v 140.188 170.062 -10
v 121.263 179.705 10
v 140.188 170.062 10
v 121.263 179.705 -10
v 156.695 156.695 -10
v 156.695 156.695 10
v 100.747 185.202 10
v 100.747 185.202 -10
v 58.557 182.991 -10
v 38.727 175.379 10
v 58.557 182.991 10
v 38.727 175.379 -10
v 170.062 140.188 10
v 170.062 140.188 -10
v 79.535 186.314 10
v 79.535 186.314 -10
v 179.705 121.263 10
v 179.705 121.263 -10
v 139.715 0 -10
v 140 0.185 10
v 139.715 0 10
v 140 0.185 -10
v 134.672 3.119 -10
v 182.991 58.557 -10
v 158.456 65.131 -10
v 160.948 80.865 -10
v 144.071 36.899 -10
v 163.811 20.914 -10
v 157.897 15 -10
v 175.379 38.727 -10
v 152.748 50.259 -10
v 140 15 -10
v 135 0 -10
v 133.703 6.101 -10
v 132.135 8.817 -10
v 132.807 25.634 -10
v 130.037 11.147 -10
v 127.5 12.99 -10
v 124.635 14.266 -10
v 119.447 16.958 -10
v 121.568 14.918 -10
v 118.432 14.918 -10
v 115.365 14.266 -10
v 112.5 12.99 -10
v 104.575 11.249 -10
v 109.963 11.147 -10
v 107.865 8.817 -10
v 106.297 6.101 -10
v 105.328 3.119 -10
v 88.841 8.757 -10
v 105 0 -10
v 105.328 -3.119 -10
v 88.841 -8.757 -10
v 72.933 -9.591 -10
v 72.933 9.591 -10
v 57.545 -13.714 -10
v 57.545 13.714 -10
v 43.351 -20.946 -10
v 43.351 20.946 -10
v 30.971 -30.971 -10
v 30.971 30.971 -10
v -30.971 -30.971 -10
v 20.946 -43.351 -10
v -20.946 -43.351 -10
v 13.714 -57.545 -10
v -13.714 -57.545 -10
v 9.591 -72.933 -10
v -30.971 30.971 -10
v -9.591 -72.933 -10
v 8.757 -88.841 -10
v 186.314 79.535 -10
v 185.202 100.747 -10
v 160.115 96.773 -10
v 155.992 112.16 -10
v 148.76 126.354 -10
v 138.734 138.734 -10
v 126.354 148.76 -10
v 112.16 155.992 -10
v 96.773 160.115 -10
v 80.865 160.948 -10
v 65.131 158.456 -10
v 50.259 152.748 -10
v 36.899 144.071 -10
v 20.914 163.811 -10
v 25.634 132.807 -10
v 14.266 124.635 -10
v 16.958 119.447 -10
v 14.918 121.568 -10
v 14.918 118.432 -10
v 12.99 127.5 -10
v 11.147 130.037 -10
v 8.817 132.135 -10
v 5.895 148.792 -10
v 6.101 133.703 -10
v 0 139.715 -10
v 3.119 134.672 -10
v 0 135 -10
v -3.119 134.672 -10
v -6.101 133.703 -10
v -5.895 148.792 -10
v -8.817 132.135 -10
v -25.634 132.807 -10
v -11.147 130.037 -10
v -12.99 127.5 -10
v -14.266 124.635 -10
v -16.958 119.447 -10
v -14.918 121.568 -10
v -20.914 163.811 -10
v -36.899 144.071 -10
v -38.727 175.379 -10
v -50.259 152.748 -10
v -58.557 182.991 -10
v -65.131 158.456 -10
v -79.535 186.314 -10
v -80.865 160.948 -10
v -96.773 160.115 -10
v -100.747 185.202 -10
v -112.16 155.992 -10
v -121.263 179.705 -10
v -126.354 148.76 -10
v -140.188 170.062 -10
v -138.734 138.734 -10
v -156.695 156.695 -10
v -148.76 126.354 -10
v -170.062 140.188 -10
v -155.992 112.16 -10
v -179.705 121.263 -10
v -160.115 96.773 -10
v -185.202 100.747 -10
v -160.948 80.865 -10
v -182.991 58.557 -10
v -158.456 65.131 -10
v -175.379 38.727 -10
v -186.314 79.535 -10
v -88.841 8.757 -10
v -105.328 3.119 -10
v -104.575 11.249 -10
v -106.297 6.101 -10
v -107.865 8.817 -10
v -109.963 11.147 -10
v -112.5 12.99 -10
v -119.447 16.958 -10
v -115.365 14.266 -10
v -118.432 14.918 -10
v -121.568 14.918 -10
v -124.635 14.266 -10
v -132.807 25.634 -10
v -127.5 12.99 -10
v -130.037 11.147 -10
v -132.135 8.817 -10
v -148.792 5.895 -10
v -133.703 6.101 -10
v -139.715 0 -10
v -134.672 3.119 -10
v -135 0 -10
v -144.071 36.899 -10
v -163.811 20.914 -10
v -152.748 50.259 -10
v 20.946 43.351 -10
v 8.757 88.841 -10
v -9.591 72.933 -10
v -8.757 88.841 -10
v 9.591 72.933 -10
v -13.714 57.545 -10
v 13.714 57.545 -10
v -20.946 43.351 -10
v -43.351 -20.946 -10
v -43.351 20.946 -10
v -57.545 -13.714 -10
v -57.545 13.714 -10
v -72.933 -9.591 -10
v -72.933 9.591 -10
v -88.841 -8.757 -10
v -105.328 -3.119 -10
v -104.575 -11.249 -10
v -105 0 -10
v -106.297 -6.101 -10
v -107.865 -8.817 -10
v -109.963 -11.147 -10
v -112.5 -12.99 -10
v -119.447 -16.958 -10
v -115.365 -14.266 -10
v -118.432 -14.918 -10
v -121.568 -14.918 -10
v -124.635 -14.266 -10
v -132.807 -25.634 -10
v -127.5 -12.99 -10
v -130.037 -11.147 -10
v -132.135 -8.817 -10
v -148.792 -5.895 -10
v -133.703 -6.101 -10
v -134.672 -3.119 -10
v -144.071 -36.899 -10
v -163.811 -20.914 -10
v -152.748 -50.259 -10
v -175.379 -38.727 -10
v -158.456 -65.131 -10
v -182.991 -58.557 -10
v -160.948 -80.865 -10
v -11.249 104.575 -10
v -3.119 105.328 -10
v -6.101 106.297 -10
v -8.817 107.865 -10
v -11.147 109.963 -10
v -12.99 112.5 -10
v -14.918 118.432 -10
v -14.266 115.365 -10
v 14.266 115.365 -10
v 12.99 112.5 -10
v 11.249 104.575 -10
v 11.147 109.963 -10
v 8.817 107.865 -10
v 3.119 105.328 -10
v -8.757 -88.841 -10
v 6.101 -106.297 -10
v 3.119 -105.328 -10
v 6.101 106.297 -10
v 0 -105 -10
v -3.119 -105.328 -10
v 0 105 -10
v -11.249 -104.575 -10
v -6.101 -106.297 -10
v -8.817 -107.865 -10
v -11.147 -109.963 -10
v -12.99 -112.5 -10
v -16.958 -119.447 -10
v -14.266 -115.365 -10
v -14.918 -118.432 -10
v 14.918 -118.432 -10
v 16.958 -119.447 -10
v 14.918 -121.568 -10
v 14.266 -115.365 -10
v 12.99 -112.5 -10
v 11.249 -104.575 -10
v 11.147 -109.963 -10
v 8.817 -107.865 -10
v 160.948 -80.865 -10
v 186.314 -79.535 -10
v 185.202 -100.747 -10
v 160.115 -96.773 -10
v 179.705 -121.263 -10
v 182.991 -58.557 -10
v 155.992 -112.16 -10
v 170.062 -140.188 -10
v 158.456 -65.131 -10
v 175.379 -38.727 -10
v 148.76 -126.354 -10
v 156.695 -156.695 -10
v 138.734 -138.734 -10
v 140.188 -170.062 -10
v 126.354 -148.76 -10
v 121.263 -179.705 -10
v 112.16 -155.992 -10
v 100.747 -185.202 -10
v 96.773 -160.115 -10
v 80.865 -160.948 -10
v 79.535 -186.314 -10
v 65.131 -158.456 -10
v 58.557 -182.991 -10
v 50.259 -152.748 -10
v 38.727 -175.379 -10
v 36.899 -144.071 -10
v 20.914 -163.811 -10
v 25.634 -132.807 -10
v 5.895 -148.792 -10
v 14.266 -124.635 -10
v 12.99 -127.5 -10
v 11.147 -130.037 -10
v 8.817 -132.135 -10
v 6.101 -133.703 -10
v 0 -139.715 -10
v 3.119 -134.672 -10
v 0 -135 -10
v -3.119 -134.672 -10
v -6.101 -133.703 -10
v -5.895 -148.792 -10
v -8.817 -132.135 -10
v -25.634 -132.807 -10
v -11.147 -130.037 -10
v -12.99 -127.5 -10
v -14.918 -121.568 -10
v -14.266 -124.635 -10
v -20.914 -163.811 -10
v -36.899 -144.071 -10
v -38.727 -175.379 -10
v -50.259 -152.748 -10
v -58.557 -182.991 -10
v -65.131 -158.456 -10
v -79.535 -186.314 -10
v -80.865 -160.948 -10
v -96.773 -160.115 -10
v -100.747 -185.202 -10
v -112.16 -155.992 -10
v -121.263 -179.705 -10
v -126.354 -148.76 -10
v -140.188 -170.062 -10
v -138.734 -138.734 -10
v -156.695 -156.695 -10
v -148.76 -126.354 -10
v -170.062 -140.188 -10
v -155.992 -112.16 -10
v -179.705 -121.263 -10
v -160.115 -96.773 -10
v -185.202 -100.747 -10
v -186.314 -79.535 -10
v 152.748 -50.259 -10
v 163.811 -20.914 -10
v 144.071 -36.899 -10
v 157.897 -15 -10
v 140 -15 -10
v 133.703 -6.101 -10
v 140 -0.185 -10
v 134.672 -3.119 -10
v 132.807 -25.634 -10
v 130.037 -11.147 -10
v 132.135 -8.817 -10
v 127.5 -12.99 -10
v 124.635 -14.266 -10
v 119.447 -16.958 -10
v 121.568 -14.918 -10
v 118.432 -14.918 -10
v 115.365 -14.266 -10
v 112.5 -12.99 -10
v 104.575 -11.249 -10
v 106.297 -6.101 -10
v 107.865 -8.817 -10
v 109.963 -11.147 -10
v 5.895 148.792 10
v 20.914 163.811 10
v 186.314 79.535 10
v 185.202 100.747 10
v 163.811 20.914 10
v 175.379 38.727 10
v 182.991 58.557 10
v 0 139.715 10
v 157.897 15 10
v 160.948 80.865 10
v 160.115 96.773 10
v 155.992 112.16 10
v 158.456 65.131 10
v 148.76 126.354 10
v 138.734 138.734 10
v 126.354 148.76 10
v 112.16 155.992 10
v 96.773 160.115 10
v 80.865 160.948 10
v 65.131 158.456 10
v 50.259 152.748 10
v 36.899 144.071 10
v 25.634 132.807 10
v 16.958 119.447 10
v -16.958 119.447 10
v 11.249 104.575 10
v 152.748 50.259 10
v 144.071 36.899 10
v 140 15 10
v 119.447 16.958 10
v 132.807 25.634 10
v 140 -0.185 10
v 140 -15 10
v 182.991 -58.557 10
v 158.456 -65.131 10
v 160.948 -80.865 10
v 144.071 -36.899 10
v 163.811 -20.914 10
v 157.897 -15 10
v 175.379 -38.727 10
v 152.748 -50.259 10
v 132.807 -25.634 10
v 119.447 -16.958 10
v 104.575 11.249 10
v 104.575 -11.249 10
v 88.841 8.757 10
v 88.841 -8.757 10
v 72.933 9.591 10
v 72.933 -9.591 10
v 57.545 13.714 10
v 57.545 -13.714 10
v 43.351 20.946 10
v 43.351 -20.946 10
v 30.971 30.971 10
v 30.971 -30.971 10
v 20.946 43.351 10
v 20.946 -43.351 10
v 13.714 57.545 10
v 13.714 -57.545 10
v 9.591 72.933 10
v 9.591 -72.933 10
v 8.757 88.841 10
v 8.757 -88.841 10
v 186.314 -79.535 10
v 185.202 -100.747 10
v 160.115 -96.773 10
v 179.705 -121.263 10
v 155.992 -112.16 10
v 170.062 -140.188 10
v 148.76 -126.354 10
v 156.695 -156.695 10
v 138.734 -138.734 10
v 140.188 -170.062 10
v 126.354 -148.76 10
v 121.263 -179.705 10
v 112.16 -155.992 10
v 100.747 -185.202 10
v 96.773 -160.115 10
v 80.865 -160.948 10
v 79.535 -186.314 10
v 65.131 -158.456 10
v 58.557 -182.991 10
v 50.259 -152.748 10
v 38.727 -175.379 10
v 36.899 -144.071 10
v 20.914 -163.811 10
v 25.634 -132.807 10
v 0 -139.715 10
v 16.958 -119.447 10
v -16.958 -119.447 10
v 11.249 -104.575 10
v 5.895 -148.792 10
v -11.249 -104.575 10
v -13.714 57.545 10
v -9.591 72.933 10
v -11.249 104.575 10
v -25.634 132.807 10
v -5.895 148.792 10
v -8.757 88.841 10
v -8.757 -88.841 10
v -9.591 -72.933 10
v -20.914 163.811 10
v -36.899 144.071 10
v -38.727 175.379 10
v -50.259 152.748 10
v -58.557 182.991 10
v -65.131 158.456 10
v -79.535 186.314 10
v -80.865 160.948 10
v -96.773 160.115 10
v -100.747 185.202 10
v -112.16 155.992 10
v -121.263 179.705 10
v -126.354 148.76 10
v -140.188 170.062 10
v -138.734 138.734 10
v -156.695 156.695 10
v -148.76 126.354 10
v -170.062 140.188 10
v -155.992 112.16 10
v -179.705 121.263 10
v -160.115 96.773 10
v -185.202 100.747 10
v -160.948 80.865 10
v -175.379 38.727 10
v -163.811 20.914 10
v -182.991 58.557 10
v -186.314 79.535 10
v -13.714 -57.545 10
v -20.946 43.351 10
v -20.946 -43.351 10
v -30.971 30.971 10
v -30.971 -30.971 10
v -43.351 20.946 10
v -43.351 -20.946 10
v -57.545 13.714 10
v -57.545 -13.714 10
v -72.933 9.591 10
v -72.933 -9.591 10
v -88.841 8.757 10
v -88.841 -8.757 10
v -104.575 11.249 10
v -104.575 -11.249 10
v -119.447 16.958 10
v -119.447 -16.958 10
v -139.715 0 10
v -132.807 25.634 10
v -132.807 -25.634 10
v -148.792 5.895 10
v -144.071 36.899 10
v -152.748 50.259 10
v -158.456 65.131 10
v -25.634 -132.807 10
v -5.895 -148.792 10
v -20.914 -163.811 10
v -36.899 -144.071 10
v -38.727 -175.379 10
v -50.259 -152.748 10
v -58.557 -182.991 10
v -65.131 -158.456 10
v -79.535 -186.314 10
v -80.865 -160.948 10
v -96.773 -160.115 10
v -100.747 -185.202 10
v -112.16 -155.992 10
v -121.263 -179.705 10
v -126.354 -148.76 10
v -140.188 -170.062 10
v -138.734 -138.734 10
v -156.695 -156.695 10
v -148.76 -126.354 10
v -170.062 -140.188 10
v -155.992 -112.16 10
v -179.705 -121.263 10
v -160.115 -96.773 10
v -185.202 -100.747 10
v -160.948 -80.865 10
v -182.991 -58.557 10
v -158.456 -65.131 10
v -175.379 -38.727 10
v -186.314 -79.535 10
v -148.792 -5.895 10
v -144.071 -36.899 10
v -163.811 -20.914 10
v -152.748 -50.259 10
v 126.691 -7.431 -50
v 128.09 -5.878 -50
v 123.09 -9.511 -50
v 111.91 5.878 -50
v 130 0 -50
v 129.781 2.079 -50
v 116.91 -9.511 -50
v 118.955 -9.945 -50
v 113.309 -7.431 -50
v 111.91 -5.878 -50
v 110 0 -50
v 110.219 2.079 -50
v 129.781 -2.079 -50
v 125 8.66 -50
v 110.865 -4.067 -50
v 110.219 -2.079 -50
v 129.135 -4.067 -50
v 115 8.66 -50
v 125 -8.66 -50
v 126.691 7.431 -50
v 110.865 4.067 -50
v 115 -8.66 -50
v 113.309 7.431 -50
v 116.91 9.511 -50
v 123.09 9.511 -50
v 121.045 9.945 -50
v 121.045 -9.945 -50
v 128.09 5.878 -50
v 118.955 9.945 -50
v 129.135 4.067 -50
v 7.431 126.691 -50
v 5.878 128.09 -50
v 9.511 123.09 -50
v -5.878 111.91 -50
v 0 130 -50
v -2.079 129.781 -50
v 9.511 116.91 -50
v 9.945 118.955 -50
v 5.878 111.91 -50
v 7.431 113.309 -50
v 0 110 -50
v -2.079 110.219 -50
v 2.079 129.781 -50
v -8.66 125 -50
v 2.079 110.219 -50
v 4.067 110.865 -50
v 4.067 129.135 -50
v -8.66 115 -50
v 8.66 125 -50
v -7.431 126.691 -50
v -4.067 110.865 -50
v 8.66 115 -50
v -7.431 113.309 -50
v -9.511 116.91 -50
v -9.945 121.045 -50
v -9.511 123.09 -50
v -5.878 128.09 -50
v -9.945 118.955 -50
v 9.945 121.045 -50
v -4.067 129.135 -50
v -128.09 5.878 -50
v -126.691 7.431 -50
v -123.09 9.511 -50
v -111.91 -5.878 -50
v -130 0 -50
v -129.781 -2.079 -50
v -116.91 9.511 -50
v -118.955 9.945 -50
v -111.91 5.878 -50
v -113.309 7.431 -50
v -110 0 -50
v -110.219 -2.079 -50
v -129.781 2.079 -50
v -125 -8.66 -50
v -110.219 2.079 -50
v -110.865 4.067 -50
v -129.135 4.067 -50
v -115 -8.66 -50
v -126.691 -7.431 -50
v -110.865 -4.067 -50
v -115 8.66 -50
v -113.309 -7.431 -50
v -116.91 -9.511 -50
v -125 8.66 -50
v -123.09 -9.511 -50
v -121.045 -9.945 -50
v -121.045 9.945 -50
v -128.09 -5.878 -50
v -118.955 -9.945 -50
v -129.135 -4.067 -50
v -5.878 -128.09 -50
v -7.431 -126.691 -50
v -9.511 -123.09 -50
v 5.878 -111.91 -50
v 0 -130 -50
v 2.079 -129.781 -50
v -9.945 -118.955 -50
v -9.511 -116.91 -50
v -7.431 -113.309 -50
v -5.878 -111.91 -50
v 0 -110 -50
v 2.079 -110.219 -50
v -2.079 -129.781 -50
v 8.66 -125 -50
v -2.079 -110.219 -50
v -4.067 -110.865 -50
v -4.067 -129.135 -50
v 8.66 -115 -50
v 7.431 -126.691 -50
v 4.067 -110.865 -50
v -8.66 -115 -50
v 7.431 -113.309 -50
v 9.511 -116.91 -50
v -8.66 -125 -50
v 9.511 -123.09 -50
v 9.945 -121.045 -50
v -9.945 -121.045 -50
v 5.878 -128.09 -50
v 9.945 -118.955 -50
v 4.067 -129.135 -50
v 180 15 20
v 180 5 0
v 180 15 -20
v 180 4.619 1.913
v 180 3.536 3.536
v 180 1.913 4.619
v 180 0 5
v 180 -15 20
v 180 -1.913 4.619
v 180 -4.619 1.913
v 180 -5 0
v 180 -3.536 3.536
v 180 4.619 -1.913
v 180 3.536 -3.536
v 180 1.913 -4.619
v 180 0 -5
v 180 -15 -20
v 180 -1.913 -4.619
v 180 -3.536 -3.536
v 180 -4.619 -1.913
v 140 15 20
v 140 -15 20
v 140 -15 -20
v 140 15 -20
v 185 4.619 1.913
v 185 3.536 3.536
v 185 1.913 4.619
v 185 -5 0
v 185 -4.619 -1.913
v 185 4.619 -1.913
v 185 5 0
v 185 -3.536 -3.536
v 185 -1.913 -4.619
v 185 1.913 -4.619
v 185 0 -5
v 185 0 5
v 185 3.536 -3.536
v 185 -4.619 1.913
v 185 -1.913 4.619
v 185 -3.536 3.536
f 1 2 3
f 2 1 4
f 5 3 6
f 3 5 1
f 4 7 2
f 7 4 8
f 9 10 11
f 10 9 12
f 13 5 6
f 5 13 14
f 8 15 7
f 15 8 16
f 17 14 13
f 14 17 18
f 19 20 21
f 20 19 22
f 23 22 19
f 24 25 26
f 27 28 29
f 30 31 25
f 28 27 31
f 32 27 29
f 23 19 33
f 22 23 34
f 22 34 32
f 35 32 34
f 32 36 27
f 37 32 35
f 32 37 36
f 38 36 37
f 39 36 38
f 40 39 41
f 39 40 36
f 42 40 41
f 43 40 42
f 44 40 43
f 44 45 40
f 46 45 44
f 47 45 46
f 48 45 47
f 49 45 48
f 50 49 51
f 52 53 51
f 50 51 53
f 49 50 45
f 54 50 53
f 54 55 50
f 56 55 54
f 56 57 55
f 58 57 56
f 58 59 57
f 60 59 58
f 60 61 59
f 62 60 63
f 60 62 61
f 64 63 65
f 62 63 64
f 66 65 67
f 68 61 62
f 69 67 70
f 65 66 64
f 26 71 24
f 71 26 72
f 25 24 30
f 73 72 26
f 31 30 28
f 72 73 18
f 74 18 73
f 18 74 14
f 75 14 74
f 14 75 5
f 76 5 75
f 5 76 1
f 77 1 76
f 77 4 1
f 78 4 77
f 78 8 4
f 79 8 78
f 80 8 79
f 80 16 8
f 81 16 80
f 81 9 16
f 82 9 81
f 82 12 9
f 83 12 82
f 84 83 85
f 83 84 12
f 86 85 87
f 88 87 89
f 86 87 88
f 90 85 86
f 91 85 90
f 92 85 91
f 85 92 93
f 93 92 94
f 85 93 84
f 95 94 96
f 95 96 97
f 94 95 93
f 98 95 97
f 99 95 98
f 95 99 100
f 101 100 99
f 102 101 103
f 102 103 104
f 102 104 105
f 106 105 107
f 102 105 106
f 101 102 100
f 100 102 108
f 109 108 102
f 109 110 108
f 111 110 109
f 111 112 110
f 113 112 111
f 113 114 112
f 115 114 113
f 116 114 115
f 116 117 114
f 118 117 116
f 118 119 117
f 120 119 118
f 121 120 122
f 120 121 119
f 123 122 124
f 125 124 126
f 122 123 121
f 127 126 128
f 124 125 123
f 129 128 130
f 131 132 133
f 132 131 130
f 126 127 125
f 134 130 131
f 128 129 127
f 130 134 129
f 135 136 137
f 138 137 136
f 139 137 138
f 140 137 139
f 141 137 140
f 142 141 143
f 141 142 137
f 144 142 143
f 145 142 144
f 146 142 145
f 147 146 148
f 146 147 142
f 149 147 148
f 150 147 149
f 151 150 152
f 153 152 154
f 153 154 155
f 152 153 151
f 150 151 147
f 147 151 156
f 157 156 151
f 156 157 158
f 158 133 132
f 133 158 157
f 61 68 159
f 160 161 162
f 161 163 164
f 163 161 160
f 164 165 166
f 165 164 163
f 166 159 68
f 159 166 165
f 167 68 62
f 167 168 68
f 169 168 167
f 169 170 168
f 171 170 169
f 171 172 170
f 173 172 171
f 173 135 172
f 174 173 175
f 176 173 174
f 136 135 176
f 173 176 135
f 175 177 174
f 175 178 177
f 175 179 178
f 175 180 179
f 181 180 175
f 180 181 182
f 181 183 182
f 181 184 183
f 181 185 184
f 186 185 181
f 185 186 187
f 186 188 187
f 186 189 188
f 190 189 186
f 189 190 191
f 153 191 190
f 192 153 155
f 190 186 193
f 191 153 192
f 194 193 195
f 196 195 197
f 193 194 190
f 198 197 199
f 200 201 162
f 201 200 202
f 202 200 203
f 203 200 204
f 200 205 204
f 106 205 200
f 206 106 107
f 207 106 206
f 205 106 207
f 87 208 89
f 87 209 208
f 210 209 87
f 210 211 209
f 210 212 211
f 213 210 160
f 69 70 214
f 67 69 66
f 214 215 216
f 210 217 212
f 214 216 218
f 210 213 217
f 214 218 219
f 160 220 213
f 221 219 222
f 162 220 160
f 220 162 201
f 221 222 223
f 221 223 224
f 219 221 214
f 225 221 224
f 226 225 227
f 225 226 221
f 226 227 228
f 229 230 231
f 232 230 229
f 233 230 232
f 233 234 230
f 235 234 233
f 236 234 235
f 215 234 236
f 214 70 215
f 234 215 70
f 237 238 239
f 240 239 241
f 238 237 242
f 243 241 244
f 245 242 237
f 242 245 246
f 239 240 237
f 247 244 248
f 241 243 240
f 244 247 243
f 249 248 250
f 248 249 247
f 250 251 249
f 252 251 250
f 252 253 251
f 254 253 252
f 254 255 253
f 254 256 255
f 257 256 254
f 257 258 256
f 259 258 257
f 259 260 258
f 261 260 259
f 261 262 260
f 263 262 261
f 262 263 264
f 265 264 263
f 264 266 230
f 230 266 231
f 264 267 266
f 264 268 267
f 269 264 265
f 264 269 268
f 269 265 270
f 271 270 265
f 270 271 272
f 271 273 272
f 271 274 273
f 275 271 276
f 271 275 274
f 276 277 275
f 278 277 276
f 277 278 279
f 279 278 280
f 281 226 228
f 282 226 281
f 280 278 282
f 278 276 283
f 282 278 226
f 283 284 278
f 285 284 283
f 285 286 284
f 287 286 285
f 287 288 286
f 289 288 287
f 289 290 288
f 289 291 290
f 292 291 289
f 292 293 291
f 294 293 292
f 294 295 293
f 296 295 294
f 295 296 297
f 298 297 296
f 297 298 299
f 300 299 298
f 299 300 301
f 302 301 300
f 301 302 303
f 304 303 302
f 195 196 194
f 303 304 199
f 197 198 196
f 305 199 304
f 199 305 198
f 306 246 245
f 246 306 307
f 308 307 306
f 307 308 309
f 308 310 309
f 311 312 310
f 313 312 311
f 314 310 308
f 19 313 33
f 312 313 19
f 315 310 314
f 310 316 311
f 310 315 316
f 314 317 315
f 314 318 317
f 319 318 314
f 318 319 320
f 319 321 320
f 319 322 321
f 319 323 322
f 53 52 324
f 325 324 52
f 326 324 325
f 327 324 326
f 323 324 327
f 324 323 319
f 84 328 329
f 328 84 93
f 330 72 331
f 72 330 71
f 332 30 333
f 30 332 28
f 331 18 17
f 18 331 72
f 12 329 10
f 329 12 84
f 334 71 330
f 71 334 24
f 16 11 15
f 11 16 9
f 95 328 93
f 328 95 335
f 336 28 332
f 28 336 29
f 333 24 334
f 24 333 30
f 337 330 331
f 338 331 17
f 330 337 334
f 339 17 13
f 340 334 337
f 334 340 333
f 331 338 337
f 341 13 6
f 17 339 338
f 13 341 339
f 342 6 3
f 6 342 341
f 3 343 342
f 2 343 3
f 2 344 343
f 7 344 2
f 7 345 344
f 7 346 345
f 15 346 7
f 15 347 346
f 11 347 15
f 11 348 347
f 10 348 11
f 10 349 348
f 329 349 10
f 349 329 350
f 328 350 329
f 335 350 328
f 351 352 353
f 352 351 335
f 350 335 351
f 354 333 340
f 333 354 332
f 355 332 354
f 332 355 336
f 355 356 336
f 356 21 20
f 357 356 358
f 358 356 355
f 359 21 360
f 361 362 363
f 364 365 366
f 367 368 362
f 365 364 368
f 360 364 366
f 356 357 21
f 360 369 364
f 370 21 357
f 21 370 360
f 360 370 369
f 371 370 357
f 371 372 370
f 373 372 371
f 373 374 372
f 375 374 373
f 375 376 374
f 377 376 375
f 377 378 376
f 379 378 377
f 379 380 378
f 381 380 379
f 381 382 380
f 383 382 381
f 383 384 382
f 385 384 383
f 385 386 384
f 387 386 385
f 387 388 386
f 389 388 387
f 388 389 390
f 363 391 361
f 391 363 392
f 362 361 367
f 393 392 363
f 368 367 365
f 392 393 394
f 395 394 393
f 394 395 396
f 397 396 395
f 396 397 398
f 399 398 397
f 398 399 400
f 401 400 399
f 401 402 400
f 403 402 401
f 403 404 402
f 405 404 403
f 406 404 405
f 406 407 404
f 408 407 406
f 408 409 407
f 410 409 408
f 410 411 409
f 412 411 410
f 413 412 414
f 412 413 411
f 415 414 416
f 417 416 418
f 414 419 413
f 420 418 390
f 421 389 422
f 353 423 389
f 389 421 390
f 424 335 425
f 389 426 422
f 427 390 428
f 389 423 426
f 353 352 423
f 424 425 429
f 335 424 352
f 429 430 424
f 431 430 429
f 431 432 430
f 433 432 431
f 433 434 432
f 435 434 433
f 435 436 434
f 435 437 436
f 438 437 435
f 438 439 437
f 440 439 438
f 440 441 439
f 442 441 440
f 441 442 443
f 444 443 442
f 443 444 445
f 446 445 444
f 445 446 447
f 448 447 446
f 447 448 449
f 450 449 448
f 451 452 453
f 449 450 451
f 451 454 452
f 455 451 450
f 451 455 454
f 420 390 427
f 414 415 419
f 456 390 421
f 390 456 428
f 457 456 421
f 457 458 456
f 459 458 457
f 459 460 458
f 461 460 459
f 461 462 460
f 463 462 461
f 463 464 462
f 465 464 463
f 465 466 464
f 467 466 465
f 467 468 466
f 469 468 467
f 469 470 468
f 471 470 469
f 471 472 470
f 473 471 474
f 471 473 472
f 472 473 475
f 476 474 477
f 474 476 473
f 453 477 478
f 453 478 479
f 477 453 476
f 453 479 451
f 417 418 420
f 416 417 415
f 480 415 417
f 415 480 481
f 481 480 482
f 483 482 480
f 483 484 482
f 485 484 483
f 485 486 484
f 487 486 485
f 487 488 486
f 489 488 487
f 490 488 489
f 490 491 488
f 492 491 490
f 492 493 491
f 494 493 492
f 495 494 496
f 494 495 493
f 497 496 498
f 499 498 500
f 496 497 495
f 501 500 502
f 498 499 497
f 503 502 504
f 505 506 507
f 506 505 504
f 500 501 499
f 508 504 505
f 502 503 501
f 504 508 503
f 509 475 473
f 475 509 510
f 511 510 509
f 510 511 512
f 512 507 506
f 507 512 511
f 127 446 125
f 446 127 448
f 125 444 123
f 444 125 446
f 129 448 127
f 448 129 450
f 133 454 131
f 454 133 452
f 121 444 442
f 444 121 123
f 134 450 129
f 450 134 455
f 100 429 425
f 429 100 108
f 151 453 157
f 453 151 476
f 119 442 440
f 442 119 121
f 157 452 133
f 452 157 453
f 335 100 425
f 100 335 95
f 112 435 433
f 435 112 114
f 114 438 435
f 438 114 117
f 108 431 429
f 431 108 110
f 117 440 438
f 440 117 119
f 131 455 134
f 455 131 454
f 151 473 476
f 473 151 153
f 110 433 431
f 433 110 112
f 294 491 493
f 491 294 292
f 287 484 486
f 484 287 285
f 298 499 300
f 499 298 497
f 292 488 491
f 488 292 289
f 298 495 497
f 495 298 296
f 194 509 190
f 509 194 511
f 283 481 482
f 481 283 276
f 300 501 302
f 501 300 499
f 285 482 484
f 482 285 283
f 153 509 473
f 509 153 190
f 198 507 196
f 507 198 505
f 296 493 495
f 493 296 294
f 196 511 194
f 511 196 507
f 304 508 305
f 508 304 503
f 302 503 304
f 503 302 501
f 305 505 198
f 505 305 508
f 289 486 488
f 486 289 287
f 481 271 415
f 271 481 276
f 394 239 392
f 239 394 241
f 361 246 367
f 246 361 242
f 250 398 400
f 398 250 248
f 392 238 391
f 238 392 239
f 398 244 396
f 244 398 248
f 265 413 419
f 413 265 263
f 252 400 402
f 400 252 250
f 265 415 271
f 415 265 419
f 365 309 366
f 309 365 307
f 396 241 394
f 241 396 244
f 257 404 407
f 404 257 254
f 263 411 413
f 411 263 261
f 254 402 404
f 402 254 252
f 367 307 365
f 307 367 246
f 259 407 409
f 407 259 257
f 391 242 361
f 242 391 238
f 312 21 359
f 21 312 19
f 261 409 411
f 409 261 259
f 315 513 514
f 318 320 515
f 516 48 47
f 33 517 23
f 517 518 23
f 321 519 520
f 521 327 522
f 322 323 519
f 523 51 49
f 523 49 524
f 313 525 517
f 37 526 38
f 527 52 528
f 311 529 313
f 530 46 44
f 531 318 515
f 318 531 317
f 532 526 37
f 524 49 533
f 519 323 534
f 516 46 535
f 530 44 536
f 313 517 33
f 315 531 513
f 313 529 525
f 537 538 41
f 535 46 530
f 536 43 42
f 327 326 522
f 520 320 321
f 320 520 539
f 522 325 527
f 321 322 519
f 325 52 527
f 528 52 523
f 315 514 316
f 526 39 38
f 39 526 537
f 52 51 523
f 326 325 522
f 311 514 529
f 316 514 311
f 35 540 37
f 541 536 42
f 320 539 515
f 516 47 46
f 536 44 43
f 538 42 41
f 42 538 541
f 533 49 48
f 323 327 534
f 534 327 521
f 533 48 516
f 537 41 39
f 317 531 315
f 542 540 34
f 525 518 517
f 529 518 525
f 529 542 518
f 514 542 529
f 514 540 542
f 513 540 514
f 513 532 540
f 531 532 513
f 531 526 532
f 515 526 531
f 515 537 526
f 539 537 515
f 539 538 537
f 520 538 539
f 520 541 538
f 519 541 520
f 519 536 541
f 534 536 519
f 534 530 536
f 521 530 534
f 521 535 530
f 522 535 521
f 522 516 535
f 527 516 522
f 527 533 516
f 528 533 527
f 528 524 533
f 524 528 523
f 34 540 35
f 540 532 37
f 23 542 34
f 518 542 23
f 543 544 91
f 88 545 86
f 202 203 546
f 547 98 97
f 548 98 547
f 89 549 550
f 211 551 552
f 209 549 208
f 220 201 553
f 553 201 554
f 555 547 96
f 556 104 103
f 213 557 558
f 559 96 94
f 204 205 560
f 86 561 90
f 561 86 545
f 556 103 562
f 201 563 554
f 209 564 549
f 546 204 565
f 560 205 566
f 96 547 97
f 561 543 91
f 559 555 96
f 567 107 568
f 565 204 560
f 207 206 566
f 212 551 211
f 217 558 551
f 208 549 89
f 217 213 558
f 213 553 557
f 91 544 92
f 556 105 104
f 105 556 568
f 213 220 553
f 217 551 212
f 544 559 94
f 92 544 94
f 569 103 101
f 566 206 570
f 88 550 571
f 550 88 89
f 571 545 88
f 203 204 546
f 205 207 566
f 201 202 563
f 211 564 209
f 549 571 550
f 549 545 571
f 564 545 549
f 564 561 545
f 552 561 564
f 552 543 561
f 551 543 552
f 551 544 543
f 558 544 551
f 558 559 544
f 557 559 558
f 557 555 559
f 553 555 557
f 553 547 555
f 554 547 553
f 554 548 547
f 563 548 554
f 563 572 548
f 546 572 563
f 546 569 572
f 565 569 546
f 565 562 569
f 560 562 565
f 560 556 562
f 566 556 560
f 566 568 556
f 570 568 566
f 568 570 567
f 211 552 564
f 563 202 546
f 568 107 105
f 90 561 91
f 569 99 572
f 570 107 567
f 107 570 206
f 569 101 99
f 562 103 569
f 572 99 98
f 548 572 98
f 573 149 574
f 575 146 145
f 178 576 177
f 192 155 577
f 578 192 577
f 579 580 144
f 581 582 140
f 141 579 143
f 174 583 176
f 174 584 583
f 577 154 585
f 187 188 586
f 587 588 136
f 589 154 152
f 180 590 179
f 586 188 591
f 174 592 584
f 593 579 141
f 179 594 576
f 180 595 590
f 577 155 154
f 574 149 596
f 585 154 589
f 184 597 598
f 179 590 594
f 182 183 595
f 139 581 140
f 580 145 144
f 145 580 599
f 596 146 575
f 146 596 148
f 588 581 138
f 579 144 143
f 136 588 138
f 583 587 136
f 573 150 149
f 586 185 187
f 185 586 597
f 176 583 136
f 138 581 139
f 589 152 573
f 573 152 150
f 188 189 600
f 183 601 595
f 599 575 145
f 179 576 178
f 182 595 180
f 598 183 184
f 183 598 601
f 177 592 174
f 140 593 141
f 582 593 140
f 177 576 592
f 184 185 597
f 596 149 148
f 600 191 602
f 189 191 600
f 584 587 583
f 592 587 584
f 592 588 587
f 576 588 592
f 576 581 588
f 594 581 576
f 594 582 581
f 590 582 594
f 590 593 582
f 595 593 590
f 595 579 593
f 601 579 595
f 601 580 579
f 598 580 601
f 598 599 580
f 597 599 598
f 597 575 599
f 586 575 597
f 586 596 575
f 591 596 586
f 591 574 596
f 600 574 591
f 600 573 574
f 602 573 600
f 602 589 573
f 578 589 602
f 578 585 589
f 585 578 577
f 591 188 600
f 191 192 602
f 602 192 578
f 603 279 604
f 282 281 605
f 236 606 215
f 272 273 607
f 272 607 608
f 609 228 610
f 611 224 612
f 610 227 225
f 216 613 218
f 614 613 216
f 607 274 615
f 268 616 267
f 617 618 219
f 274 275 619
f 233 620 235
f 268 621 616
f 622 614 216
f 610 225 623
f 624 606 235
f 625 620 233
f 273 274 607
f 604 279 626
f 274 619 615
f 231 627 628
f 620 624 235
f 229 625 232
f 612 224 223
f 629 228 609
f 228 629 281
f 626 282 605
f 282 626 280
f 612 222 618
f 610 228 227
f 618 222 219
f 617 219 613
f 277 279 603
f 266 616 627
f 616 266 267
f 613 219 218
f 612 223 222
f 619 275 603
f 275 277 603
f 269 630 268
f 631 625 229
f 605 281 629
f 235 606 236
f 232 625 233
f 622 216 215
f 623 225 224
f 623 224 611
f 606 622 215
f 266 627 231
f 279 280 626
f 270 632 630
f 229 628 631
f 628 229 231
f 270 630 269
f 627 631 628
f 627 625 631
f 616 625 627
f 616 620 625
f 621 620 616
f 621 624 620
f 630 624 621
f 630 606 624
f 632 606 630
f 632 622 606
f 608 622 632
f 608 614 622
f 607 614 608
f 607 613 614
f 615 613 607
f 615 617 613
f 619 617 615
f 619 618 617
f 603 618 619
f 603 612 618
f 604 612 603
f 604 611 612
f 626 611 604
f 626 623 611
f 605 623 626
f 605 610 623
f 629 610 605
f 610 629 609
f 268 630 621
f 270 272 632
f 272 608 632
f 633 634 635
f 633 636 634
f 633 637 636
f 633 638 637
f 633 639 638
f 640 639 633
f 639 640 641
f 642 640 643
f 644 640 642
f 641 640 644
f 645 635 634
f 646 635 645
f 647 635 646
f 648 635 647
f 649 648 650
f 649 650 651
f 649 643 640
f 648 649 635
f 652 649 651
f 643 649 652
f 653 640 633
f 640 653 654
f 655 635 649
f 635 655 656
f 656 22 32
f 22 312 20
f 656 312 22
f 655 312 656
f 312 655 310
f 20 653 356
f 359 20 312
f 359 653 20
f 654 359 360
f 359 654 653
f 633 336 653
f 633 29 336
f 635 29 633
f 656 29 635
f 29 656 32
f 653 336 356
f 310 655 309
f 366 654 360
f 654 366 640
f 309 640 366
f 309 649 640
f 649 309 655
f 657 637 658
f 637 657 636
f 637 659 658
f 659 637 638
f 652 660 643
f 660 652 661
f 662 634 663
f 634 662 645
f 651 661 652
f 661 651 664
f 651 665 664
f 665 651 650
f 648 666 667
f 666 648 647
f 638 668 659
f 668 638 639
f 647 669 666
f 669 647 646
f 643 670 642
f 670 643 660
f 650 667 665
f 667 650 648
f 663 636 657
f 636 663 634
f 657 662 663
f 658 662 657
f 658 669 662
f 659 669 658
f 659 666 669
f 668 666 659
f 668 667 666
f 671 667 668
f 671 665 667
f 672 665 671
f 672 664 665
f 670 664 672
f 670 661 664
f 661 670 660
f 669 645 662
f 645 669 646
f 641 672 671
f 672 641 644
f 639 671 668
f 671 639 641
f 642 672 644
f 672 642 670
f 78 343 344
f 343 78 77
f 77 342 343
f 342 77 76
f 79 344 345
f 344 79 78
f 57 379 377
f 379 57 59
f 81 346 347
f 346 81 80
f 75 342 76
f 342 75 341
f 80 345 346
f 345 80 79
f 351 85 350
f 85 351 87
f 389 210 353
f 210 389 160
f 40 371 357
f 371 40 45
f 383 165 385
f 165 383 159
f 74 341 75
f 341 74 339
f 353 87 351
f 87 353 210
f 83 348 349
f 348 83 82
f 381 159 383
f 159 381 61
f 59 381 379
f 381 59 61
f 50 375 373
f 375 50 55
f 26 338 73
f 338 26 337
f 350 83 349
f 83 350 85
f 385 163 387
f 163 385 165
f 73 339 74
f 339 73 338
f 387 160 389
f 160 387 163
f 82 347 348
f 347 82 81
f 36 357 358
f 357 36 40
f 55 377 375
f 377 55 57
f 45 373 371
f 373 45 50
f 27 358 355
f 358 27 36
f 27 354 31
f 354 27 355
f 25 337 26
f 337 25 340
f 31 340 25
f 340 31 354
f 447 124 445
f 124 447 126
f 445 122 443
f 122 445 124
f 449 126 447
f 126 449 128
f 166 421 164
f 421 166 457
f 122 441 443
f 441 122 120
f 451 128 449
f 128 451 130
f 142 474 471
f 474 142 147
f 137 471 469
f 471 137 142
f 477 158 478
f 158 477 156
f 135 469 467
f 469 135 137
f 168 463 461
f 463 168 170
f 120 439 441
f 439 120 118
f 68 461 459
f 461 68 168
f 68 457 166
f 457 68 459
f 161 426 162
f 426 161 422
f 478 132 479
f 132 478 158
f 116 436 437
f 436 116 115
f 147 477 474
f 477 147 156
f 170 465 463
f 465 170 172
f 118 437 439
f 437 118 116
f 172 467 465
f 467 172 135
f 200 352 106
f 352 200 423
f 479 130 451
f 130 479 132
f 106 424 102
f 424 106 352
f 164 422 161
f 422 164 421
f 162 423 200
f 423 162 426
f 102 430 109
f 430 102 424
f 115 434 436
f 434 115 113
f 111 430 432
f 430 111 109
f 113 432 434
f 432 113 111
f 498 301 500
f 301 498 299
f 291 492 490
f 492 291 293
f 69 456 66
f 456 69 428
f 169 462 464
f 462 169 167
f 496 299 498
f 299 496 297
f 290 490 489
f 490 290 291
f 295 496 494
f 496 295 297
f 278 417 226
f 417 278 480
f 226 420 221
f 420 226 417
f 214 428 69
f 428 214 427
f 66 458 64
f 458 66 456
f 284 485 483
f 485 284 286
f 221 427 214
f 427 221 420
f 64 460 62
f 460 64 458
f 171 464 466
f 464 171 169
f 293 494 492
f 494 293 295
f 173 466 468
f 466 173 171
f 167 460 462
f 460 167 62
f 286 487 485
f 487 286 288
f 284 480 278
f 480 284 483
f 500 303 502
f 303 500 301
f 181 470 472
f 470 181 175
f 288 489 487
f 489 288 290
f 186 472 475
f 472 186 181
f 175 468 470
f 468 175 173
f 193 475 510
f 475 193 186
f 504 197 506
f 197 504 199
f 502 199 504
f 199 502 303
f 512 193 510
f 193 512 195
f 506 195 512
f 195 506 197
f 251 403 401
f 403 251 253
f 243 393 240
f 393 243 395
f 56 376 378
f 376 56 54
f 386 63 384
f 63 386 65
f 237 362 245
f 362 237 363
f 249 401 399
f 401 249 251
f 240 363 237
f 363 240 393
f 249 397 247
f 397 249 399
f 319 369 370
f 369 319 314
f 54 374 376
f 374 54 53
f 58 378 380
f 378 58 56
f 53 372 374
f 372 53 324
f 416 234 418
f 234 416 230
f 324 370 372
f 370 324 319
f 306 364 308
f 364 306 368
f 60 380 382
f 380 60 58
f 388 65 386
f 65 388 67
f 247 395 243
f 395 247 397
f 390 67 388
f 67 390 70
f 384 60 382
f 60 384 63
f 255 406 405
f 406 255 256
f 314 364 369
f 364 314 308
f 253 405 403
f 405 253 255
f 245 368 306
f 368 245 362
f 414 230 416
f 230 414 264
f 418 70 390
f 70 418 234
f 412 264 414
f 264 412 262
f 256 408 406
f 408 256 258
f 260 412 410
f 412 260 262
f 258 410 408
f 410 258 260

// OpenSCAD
// Facet variables
// $fs = 0.15;
// $fa = 2;

// Variables
ref_inch_mul = 25.4;
prop_center_h_offset = 120;
prop_center_v_offset = 120;
cover_prop_inner = 3 * ref_inch_mul;
cover_prop_outer = 4 * ref_inch_mul;
prop_rad = 3 * ref_inch_mul;
body_thickness = 20;

difference() {
    
    union() {
        for (i = [45:90:360]) {
            rotate([0, 0, i])
            translate([prop_center_h_offset, 0, 0]) 
            cylinder(h = body_thickness, r = cover_prop_outer, center=true);
            }
            
        for (i = [0:90:360]) {
            rotate([0, 0, i])
            translate([120, 0, -30]) 
            cylinder(h = 40, r1 = 10, r2 = 15, center=true);
            }
        
        cylinder(h = body_thickness, r = 30, center = true);
        translate([160, 0, 0]) cube([40, 30, 40], center = true);
        translate([180, 0, 0]) 
            rotate([0, 90, 0]) 
            cylinder(h = 10, r = 5, center = true );
             
    } // End of Union

    for (i = [45:90:360]) {
        rotate([0, 0, i])
        translate([prop_center_h_offset, 0, 0]) 
        cylinder(h = body_thickness+1, r = cover_prop_inner, center=true);
        }
}
